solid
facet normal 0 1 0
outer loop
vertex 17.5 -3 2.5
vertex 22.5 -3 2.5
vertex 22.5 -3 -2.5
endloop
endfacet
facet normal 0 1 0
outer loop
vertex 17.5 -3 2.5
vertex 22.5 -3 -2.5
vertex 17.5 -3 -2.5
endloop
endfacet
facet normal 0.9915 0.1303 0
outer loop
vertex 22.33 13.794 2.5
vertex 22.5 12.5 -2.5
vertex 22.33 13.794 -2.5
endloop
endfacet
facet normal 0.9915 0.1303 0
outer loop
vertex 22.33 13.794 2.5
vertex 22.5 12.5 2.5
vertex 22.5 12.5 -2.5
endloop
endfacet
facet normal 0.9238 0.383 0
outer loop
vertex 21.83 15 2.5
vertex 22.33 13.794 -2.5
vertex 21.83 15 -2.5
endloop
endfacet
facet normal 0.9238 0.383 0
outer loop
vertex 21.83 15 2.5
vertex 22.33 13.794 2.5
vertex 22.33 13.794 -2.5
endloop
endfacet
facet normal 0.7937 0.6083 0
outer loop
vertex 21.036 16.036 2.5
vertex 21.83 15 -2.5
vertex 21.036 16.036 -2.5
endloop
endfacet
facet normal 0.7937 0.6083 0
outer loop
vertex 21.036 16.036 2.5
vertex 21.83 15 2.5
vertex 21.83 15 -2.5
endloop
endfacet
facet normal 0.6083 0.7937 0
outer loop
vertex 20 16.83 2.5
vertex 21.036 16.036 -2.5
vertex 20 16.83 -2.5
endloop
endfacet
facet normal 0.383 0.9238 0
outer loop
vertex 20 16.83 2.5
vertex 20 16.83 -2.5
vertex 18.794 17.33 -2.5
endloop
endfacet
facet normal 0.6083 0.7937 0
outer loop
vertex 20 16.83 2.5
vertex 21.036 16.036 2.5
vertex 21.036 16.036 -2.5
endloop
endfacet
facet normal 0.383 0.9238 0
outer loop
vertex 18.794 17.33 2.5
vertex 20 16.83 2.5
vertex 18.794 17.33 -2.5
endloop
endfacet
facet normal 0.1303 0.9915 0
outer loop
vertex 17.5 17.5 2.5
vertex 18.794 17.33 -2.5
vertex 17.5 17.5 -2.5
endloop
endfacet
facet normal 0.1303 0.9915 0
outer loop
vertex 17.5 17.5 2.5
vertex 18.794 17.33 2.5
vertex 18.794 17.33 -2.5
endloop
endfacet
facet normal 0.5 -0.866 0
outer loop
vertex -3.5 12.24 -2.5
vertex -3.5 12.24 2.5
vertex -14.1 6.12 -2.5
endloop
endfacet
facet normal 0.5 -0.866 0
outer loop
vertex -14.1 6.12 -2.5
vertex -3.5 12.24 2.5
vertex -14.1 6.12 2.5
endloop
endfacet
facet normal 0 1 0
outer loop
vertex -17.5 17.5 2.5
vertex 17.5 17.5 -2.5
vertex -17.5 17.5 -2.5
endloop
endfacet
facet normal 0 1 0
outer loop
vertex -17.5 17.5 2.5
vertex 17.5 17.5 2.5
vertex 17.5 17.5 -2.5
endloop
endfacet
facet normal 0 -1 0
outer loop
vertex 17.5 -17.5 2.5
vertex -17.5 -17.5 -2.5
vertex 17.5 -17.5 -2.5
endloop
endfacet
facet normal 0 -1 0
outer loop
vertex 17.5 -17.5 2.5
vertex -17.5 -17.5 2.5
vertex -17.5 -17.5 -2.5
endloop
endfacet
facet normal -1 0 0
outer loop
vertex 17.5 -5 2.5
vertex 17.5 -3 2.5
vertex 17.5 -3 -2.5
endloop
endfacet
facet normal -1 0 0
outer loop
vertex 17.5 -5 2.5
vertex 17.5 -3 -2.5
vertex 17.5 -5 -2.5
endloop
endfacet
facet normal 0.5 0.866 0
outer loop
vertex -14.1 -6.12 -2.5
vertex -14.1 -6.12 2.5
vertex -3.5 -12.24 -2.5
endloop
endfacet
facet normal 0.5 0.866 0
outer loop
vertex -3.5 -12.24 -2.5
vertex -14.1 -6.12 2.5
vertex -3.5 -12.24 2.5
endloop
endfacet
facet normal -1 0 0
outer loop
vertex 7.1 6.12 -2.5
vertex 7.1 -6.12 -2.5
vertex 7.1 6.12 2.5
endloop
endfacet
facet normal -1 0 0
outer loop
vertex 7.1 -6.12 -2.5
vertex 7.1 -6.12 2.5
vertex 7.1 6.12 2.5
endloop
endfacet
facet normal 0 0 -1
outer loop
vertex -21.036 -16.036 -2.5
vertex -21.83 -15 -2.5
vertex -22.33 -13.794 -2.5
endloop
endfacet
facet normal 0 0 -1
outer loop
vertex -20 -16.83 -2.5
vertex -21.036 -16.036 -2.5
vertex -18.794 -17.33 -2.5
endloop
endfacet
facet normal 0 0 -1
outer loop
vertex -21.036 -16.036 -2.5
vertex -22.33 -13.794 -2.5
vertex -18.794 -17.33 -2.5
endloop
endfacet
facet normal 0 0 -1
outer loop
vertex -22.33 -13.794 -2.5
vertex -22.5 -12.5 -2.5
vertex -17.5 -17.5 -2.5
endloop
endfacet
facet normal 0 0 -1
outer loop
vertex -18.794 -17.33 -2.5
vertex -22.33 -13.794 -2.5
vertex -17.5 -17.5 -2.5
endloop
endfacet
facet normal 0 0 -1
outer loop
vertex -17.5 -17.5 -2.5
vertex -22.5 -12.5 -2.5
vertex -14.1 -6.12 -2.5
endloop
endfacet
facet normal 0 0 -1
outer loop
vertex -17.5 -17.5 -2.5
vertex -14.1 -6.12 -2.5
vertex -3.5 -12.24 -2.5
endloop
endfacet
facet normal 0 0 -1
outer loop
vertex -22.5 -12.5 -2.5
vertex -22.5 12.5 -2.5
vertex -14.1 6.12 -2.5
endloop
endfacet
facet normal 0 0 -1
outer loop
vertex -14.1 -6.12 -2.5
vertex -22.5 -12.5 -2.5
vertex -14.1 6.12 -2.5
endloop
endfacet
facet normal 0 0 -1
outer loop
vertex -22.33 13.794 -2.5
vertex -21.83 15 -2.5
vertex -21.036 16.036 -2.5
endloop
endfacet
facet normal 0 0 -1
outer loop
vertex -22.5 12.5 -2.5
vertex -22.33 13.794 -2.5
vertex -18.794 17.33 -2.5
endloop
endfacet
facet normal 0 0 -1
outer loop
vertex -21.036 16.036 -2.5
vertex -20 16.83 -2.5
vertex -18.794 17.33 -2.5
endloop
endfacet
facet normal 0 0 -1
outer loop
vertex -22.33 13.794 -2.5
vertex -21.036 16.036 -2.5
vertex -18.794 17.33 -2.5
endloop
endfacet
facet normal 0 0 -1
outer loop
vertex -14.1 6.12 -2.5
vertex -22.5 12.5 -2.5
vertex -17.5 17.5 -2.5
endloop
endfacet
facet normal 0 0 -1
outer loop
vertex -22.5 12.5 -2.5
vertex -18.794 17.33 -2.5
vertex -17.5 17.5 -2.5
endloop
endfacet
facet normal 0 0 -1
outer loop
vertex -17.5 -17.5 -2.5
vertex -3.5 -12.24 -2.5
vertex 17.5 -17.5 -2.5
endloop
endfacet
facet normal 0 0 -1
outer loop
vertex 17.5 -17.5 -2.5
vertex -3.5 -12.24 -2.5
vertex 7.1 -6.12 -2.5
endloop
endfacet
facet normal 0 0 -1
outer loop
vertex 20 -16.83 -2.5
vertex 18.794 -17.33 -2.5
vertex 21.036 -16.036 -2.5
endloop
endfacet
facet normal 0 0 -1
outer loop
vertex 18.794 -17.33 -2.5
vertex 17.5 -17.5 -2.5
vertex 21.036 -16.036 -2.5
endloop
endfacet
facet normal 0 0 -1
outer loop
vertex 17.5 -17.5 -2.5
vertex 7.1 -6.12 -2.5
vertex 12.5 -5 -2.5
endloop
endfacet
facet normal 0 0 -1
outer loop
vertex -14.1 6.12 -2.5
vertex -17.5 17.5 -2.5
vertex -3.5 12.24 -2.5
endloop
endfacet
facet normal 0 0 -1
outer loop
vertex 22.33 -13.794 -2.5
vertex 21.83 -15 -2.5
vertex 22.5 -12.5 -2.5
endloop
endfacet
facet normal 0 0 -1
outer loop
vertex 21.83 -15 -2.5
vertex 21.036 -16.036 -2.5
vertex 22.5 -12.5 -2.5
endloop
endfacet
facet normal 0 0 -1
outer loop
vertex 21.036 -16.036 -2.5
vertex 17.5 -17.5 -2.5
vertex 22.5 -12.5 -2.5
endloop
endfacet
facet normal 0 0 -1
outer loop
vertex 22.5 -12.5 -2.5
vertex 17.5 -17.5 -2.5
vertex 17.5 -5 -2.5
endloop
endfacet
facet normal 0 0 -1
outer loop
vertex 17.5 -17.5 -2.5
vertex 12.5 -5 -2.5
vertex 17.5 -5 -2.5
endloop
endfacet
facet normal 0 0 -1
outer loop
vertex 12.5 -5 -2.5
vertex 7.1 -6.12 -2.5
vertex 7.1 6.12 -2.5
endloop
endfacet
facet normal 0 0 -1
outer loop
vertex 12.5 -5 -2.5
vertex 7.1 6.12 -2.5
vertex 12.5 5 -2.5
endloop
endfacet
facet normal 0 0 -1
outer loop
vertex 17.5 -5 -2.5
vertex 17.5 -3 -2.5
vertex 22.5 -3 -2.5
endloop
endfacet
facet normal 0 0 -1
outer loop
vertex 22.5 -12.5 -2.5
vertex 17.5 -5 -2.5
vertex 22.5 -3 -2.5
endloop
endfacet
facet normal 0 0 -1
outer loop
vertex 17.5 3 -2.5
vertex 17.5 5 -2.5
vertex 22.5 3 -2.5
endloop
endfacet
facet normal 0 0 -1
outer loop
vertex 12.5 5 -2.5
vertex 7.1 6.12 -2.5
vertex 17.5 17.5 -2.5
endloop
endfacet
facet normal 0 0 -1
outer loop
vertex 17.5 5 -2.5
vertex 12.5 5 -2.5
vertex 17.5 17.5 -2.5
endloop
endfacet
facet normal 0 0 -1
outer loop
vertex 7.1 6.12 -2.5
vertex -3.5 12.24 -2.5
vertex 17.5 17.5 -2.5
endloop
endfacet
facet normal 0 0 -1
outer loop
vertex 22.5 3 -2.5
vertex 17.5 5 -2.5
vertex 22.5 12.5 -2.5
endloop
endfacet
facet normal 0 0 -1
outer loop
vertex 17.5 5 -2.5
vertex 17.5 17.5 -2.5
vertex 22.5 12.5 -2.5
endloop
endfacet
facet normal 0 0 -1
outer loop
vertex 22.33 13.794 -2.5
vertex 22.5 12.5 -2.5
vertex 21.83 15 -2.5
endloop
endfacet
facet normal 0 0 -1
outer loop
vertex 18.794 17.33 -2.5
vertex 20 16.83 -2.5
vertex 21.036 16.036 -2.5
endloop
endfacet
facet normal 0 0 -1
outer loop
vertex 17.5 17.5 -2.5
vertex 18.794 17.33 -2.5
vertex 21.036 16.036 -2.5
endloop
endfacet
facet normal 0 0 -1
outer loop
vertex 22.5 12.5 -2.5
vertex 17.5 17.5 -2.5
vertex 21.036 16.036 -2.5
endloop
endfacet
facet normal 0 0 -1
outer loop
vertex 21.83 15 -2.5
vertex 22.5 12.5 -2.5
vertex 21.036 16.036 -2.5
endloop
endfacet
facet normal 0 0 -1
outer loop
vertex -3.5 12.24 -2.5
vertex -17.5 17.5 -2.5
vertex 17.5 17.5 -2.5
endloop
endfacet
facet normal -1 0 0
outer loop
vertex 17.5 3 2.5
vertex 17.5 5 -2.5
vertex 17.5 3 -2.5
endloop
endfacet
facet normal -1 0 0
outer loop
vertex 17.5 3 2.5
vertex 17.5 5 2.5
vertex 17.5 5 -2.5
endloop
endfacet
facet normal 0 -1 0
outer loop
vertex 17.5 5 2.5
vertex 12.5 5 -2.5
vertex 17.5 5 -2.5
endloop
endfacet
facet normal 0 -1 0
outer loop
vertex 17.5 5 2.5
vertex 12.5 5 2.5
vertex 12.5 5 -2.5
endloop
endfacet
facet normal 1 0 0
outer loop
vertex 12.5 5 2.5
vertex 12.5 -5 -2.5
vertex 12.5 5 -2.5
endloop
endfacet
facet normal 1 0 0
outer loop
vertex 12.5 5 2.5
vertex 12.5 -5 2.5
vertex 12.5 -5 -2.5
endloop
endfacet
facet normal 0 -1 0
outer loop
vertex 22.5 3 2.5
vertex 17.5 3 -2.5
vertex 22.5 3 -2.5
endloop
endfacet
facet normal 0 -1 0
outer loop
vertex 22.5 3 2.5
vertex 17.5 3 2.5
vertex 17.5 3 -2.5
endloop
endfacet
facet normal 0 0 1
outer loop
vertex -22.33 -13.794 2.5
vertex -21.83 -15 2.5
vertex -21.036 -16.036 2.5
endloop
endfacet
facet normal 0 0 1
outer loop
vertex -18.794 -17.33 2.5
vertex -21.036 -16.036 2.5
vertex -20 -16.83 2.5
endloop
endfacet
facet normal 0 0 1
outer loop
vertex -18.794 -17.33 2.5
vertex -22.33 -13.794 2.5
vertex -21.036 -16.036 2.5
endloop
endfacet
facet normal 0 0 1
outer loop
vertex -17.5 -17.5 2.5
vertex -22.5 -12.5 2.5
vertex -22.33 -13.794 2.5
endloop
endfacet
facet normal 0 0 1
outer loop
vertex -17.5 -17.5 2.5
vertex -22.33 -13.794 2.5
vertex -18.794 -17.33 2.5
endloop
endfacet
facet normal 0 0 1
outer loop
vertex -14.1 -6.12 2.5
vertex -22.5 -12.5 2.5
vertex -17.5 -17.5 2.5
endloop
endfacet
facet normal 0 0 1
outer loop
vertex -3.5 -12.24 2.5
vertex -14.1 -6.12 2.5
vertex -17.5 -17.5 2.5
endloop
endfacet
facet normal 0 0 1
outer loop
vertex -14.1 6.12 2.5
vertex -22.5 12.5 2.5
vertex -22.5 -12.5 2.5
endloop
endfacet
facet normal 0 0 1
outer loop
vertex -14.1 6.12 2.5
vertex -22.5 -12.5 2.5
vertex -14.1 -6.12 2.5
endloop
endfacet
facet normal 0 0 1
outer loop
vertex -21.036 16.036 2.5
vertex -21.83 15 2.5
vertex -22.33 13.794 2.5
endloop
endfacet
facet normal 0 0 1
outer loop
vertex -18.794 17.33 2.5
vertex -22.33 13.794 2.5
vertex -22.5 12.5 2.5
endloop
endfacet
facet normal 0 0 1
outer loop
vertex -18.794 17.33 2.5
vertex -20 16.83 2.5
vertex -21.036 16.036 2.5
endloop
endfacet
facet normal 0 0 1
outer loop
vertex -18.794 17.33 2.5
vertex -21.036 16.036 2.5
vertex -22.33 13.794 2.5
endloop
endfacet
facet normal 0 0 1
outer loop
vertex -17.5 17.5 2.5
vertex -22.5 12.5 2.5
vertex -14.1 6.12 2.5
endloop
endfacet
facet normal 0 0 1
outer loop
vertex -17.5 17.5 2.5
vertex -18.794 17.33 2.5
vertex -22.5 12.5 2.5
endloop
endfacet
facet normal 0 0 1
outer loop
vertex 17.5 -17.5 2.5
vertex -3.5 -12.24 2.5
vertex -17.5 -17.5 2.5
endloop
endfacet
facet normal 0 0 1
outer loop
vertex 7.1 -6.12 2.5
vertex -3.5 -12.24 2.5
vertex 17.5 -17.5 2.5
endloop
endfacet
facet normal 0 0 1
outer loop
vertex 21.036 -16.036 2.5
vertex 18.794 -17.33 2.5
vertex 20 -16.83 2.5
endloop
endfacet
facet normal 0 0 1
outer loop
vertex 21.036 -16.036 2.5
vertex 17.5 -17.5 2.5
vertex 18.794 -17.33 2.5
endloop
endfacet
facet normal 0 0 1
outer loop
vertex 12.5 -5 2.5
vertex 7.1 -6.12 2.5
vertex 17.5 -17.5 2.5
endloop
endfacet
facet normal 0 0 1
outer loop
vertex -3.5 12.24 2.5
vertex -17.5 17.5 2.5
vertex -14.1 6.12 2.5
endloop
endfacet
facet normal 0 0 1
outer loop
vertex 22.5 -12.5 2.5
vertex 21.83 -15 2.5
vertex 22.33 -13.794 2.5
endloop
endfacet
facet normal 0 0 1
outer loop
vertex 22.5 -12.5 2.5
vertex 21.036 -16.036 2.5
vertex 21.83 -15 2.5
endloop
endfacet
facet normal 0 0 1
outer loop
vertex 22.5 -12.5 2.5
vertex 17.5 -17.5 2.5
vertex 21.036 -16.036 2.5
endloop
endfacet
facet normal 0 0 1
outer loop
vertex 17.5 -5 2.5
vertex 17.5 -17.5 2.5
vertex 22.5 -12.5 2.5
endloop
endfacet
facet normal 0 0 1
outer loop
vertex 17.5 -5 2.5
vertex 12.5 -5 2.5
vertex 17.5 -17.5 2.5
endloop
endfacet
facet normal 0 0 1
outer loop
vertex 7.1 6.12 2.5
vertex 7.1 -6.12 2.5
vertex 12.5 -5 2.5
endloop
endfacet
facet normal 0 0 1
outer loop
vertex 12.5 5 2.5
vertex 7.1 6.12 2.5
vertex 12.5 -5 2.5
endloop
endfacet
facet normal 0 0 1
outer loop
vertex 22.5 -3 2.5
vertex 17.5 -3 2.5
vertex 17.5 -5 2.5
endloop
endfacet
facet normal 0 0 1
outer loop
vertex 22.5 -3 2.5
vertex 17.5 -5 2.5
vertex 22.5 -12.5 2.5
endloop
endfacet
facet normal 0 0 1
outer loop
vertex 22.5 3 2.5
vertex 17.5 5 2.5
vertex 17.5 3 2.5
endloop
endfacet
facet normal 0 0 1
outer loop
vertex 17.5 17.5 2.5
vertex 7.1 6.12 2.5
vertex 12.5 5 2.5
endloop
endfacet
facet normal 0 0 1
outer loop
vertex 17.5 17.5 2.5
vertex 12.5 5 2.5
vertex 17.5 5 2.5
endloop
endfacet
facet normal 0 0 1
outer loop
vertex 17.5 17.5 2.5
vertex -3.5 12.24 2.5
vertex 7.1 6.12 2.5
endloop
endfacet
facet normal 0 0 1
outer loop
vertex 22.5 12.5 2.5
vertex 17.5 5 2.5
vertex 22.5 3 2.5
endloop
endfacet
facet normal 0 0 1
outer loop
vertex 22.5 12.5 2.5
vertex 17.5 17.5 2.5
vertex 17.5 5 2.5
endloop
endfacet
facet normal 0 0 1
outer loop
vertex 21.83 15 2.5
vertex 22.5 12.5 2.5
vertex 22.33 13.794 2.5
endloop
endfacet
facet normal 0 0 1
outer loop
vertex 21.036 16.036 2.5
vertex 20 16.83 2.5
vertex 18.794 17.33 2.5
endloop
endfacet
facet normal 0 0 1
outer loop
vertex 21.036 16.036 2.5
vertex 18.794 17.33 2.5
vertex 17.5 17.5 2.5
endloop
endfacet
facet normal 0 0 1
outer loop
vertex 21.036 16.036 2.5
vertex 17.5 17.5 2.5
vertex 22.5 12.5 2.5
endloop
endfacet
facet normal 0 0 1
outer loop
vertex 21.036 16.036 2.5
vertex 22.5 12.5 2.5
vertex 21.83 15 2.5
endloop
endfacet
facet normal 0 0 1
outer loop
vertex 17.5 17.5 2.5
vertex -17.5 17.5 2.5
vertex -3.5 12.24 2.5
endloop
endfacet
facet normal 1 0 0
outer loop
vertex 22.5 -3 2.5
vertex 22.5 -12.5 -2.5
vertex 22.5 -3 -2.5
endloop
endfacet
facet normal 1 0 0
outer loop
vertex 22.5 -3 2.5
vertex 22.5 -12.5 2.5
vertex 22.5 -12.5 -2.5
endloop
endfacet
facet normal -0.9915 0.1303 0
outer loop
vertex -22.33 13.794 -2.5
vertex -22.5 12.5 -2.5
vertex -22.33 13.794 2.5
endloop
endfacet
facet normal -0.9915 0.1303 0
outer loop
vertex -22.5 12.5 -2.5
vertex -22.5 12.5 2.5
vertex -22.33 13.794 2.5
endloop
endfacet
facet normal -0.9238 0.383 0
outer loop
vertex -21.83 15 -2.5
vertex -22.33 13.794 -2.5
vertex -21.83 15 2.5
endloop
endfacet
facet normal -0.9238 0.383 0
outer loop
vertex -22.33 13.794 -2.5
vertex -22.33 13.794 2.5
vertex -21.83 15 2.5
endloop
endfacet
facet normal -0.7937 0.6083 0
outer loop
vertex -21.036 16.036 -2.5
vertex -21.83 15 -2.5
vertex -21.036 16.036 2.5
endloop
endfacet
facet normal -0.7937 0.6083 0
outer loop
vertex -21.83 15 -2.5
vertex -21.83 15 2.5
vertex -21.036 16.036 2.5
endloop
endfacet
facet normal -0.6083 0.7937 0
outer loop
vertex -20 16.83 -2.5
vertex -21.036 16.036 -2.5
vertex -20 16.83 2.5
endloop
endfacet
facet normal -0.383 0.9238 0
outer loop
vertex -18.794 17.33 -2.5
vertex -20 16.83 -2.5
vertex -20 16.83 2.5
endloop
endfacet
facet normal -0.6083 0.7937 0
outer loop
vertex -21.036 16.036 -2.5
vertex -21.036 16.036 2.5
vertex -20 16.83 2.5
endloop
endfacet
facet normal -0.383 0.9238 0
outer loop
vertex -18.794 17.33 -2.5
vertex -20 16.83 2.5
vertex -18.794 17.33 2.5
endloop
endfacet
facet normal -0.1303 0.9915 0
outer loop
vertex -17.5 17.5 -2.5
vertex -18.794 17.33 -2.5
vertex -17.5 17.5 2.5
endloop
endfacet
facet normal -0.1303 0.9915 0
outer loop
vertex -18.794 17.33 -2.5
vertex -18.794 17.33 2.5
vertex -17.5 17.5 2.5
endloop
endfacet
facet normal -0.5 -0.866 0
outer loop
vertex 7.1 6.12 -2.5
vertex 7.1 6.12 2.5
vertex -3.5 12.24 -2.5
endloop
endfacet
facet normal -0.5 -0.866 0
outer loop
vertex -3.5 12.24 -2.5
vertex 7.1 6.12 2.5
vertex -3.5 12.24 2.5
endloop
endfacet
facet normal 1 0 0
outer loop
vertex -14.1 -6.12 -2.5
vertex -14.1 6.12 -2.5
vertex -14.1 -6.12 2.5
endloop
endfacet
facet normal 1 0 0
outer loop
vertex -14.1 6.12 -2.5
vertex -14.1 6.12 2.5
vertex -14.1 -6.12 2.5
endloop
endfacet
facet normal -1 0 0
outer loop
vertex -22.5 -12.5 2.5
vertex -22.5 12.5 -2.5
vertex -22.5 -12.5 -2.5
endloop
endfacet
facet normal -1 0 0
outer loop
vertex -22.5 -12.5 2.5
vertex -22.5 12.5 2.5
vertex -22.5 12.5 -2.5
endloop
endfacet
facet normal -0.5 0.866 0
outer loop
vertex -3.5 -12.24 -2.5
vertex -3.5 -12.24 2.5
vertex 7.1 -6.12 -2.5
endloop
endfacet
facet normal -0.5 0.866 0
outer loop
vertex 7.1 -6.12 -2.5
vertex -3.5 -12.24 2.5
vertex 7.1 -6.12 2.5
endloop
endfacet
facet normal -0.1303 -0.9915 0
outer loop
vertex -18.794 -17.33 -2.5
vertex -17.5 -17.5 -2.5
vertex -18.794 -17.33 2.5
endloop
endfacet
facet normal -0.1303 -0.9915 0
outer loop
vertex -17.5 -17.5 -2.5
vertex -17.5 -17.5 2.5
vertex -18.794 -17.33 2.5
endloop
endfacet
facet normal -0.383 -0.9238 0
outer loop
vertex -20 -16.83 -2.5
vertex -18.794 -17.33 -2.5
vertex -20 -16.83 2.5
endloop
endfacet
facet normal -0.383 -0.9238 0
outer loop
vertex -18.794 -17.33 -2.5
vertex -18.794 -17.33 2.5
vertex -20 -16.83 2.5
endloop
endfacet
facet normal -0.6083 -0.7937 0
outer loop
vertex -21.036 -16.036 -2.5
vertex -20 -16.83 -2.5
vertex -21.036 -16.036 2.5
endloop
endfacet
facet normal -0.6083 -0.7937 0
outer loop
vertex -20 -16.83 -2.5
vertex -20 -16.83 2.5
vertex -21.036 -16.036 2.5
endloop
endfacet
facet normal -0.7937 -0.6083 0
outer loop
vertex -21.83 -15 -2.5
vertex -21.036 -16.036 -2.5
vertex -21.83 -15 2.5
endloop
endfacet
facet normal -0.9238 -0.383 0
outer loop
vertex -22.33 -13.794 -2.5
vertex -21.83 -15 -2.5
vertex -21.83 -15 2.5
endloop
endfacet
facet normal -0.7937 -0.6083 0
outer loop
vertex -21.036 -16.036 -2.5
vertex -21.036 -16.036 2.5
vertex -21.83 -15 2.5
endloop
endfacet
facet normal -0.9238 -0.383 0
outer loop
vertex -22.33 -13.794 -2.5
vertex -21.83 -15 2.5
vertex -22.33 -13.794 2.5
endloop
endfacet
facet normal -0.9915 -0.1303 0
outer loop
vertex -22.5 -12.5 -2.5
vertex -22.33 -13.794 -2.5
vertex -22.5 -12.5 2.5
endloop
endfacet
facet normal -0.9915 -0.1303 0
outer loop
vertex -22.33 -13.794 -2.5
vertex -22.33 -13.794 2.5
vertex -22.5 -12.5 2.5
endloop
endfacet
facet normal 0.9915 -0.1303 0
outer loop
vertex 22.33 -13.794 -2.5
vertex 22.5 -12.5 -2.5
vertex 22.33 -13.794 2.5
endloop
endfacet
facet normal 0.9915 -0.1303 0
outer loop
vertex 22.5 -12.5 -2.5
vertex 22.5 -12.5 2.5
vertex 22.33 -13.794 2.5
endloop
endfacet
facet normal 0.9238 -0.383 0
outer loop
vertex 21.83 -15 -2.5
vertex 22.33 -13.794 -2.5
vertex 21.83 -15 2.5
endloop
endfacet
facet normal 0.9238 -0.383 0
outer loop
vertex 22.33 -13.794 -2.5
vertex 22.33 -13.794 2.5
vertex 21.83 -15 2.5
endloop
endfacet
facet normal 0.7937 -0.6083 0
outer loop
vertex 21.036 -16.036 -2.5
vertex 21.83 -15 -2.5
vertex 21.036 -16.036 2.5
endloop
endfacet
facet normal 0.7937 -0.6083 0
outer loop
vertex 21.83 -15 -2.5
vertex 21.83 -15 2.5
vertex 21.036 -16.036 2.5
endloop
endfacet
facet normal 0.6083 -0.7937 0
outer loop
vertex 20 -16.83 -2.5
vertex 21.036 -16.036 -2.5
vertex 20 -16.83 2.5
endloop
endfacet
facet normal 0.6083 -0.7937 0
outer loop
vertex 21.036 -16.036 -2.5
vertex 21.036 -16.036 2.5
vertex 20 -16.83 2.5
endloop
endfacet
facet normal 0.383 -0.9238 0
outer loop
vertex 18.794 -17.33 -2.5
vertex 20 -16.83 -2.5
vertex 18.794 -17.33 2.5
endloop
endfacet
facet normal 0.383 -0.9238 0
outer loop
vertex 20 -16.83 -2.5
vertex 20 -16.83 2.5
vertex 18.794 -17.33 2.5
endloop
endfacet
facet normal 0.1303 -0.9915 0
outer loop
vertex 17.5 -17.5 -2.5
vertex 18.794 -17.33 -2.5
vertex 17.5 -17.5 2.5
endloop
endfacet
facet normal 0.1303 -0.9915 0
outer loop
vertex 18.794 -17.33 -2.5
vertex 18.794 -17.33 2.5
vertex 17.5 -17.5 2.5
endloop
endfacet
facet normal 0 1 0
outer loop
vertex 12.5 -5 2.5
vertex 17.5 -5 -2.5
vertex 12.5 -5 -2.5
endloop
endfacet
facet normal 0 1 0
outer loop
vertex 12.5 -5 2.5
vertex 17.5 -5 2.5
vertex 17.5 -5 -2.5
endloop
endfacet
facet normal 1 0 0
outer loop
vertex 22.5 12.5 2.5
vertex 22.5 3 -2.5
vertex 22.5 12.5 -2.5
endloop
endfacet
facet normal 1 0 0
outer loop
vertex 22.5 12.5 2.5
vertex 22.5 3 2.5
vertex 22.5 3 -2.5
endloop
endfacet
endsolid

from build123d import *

# Parameters (mm, degrees)
BOSS_EXTRU_1_DEPTH = 2.5
CONG_1_R           = 5


with BuildPart() as part:
    # Esquisse1 → Boss.-Extru.1 (new body, symmetric)
    with BuildSketch(Plane.XY):
        Polygon((22.5, 3), (22.5, 17.5), (-22.5, 17.5), (-22.5, -17.5), (22.5, -17.5), (22.5, -3), (17.5, -3), (17.5, -5), (12.5, -5), (12.5, 5), (17.5, 5), (17.5, 3), align=None)
        Polygon((7.1, 6.119912853), (-3.5, 12.239825707), (-14.1, 6.119912853), (-14.1, -6.119912853), (-3.5, -12.239825707), (7.1, -6.119912853), align=None, mode=Mode.SUBTRACT)
    extrude(amount=BOSS_EXTRU_1_DEPTH, both=True)

    # Congé1
    cong_1_edges = [part.edges().sort_by_distance(p)[0] for p in [
        (-22.5, 17.5, 0),
        (22.5, 17.5, 0),
        (22.5, -17.5, 0),
        (-22.5, -17.5, 0),
    ]]
    fillet(cong_1_edges, radius=CONG_1_R)


solid = part.part
